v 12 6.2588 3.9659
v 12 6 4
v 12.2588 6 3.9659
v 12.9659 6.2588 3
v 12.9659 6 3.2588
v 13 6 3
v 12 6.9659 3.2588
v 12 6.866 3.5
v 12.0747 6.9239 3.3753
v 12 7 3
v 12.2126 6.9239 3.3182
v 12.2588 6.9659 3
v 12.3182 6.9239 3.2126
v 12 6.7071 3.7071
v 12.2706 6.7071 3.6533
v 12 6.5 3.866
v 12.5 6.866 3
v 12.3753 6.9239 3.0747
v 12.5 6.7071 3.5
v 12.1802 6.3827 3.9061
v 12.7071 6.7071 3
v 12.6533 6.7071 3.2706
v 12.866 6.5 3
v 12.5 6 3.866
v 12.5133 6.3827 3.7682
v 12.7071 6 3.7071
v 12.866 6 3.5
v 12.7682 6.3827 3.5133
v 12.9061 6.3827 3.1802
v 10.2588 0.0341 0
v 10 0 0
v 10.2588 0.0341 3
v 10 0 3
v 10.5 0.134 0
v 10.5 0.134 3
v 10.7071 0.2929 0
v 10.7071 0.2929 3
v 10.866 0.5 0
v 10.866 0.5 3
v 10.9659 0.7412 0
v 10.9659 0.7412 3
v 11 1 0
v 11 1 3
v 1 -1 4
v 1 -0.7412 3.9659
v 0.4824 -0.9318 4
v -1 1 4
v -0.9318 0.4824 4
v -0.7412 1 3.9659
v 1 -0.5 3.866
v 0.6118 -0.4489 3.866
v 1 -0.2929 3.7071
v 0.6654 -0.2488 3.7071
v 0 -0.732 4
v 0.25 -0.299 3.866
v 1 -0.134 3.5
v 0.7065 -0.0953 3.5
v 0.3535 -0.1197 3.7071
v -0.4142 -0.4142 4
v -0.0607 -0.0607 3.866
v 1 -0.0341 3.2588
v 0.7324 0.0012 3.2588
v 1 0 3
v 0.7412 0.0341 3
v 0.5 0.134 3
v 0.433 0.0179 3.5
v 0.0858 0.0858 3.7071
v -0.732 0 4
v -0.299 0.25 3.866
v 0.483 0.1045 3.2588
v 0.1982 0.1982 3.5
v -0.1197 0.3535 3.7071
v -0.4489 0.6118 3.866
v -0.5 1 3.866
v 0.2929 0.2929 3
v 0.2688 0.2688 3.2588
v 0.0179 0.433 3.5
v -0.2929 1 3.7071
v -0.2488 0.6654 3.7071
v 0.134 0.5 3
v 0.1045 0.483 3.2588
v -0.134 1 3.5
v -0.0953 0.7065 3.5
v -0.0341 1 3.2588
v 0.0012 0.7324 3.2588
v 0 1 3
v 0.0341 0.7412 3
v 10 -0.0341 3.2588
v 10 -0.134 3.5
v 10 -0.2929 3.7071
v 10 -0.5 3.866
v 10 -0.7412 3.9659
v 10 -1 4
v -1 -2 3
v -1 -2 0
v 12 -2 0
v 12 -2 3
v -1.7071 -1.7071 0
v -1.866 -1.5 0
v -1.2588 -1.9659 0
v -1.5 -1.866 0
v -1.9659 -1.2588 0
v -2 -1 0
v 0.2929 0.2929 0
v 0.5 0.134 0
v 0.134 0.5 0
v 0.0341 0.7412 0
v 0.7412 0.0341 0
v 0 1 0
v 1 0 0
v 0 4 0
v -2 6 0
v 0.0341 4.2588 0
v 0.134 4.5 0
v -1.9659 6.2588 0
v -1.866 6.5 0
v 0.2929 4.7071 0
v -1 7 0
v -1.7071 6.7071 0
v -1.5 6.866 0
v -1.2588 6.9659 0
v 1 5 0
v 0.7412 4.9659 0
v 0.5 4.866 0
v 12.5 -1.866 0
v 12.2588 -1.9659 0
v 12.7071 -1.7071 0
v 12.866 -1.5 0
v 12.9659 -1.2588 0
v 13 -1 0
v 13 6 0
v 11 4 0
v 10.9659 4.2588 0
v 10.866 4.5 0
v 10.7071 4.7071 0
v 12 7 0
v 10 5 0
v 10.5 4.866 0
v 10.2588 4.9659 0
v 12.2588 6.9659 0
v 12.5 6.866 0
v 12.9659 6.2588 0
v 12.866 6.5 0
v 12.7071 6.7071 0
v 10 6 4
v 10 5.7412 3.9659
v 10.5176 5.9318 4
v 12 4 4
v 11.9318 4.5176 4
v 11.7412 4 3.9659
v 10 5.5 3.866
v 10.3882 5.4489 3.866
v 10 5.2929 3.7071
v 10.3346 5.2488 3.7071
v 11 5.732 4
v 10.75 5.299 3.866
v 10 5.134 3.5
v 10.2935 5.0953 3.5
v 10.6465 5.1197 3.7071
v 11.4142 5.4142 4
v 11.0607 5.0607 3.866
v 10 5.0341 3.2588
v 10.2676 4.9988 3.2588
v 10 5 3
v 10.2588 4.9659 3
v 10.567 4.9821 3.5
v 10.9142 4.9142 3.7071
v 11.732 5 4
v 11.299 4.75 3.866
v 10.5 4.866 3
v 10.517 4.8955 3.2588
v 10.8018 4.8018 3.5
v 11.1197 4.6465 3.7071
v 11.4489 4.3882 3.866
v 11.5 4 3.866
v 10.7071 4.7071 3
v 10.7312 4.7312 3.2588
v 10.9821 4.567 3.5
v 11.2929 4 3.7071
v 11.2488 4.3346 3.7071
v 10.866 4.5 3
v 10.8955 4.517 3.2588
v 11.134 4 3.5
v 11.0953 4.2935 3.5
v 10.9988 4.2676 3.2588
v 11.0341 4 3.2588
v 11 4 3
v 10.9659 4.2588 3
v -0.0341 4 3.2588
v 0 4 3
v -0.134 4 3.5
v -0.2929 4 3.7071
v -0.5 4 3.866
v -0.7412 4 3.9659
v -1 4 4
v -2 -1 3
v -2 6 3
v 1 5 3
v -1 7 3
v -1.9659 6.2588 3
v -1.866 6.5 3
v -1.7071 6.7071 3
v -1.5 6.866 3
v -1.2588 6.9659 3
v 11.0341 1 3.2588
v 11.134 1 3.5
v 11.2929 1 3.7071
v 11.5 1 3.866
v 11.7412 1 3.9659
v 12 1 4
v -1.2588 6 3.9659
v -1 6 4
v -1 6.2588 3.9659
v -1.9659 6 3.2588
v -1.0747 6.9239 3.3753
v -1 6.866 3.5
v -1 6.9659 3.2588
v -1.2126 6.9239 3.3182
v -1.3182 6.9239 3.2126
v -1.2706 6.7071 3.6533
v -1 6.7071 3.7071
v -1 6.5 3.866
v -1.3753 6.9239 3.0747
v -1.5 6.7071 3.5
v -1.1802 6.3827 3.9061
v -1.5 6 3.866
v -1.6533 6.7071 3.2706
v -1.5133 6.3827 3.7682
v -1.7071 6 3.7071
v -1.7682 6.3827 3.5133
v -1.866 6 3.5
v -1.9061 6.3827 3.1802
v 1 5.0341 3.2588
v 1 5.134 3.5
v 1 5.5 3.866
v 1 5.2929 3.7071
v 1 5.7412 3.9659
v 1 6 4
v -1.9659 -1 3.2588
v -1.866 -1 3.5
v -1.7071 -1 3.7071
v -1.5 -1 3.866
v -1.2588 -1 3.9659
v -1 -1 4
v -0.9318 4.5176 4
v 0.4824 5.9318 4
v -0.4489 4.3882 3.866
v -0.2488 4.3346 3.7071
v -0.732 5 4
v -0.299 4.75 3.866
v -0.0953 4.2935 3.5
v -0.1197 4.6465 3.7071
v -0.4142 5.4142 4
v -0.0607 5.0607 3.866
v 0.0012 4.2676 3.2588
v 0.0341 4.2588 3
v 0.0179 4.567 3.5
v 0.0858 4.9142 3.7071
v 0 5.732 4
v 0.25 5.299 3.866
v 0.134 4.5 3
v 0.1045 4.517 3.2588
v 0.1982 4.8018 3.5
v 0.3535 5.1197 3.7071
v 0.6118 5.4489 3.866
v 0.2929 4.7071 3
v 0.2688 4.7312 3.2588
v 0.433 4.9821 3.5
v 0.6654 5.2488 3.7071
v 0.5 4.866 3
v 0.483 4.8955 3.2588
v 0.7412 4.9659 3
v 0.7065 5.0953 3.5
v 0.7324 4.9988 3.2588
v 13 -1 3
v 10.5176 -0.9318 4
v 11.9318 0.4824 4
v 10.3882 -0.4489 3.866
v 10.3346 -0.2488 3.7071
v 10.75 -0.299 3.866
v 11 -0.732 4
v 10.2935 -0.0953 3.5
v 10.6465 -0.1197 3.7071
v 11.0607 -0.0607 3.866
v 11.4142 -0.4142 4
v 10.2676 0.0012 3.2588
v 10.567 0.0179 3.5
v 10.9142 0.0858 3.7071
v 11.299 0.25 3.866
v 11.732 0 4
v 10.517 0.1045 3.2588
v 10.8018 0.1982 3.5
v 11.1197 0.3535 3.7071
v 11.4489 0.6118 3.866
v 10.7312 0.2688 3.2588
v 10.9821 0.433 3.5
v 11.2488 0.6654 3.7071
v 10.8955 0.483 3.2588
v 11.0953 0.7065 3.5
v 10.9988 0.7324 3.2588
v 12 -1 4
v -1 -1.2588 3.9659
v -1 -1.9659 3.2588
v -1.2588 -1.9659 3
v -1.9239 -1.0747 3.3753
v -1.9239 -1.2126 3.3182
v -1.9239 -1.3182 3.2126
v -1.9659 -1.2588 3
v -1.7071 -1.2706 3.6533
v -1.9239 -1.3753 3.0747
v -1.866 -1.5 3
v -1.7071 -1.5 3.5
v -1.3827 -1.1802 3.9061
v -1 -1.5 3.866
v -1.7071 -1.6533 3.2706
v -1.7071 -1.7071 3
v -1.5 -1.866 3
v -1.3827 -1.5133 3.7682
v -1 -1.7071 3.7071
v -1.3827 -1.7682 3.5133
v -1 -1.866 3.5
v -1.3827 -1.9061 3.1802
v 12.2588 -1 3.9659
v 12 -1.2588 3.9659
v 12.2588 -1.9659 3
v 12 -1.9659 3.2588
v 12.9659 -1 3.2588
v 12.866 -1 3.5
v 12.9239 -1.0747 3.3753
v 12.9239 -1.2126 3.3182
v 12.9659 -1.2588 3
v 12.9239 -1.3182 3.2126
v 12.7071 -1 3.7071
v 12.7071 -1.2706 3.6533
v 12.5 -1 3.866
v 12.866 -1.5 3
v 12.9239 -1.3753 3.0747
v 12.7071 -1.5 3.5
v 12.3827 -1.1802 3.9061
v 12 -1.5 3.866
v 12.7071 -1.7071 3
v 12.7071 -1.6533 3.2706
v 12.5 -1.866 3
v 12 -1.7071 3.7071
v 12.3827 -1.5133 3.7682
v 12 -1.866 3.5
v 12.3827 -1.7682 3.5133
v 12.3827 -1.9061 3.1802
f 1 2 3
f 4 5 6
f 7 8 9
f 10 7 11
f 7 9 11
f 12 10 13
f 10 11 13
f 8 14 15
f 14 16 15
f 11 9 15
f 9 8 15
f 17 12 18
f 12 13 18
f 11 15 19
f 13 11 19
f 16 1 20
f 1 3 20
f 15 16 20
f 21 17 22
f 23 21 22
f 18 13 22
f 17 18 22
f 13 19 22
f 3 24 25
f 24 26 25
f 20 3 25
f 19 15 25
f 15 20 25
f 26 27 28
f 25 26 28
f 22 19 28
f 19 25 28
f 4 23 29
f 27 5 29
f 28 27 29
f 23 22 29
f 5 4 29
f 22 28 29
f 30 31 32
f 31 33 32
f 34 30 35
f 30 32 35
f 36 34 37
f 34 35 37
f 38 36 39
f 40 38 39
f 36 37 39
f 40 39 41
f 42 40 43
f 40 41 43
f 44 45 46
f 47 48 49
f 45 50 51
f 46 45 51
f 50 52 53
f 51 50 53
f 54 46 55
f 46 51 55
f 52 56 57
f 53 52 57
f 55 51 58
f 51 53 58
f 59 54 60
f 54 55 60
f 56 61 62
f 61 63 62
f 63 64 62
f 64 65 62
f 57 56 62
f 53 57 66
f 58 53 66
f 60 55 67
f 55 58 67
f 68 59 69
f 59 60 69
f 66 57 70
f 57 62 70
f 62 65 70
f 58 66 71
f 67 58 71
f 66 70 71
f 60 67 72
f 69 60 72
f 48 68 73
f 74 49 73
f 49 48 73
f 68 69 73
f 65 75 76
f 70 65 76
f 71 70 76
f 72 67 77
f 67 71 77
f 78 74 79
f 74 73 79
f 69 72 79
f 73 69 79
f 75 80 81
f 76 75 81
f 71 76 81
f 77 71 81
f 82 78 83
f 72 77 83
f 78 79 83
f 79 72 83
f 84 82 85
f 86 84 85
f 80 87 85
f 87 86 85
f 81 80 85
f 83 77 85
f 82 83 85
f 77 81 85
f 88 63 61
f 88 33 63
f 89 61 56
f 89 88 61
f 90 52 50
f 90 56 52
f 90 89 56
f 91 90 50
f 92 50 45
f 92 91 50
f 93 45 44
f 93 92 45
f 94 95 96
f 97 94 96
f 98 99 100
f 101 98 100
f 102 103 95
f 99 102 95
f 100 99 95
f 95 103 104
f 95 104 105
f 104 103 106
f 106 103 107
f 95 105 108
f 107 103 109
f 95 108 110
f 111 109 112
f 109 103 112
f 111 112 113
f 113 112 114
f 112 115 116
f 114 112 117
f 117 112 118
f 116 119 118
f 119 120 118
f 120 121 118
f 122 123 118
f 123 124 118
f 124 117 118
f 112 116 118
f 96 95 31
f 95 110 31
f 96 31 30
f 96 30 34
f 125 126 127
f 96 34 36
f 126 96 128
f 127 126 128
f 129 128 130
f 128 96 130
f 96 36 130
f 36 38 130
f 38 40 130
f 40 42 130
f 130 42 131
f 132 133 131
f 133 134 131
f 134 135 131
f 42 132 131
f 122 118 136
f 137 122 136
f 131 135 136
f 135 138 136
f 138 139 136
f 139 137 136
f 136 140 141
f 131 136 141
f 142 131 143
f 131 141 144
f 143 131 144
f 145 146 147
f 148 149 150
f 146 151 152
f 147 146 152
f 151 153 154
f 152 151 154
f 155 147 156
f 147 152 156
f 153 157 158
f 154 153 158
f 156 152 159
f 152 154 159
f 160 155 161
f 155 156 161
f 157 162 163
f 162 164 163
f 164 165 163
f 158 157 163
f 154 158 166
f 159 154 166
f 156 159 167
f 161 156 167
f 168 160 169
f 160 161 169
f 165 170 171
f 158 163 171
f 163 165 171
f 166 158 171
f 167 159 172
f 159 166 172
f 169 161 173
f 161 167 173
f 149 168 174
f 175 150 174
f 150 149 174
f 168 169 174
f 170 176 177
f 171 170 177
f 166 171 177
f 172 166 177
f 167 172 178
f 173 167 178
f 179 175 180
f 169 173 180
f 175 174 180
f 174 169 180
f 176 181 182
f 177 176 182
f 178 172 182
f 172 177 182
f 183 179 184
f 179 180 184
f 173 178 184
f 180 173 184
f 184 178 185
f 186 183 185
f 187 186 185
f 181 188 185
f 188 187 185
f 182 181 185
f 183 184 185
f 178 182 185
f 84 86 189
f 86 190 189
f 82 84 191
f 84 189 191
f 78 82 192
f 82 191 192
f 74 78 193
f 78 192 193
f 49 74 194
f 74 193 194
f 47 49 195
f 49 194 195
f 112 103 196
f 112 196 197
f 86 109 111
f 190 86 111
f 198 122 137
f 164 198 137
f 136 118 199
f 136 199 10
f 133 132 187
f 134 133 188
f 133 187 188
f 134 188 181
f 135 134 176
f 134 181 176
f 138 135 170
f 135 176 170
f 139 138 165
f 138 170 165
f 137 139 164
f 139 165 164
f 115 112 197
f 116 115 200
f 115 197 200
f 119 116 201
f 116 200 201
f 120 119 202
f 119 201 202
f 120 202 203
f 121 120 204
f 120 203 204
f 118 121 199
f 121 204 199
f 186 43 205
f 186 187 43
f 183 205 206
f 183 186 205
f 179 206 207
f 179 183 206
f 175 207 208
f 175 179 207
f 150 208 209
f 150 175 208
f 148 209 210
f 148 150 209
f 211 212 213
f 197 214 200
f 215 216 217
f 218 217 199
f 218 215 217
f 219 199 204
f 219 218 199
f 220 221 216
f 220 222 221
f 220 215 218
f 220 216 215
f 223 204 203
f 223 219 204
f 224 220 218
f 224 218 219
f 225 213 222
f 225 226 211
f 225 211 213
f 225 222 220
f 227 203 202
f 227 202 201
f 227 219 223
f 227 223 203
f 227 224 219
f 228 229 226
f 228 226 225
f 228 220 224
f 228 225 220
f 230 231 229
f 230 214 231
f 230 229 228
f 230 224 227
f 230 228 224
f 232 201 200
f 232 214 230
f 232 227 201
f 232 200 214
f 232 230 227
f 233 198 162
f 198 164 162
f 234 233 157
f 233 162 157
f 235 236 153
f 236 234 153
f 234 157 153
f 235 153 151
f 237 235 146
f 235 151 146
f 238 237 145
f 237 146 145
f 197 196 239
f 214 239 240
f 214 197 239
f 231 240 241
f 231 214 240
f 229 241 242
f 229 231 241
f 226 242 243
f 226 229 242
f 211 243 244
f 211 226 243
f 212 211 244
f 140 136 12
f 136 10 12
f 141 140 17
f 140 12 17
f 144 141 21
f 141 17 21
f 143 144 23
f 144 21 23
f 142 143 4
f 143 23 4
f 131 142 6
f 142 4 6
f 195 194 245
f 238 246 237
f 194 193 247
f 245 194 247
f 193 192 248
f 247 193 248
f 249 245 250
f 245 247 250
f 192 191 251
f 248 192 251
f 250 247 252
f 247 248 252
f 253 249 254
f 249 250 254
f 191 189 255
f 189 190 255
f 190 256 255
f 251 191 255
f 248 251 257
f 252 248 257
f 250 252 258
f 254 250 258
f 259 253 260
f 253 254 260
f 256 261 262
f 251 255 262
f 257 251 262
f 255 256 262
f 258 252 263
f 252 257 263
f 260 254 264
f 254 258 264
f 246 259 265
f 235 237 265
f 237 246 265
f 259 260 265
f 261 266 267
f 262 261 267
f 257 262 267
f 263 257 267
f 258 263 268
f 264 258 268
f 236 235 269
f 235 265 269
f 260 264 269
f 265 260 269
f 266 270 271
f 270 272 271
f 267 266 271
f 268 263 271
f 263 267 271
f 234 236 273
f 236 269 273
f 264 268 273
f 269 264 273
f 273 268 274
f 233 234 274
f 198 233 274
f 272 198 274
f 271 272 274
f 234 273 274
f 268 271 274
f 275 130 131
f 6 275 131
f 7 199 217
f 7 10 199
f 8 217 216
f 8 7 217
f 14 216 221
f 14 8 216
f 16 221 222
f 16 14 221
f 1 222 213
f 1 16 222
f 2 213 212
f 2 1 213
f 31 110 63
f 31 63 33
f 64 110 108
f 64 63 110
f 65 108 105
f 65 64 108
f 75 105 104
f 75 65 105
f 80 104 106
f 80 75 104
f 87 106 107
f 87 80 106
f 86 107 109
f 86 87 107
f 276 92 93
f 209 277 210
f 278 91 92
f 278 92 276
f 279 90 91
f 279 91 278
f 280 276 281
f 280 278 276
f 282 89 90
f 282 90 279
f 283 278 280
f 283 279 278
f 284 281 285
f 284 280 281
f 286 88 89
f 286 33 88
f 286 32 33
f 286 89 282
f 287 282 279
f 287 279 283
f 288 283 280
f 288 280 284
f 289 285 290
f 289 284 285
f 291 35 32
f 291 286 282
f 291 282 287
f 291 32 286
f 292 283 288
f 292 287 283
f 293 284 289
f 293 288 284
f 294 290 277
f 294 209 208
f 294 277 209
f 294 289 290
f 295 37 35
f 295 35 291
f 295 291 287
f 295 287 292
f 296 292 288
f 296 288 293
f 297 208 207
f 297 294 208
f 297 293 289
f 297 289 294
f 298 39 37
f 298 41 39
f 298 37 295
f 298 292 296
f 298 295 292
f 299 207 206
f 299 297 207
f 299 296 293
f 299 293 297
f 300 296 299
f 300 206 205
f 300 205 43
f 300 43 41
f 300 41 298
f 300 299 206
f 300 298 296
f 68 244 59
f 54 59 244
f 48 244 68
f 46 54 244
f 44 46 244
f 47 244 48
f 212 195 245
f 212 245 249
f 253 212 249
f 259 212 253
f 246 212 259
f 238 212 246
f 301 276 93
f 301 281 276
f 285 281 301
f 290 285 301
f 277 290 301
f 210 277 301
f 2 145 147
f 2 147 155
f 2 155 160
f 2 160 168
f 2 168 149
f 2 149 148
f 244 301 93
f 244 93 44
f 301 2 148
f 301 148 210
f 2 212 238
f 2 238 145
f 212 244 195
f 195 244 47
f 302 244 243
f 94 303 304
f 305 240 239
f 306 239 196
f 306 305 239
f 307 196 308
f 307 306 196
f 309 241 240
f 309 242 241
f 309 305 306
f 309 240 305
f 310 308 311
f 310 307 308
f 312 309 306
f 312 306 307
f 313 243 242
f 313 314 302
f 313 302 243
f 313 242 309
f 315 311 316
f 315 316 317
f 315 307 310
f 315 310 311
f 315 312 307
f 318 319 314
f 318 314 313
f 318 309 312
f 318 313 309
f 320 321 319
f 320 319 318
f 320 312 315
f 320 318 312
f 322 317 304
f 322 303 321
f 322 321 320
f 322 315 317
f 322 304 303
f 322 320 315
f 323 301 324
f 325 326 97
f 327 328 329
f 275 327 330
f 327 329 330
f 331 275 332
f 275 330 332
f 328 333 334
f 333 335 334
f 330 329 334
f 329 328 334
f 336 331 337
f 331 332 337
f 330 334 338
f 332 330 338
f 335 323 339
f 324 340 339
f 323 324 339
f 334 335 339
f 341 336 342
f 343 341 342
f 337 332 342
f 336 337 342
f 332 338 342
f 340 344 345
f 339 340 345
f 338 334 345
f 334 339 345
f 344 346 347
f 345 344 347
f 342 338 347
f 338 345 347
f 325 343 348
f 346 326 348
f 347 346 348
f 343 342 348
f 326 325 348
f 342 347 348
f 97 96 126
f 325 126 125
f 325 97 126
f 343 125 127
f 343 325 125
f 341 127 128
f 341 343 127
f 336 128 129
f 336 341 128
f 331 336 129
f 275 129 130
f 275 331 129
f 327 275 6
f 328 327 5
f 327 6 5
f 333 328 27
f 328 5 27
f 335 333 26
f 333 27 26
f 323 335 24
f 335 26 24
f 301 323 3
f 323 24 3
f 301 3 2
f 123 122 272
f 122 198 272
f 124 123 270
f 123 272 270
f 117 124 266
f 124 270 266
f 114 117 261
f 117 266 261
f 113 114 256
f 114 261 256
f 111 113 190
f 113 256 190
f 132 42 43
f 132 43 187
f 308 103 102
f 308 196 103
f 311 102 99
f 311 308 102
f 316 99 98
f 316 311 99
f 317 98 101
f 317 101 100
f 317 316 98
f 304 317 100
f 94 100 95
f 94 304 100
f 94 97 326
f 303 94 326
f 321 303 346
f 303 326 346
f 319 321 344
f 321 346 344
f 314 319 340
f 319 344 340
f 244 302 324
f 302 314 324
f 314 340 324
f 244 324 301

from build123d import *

# Parameters (mm, degrees)
F0_W     = 15
F0_H     = 9
F0_W_2   = 11
F0_H_2   = 5
F1_DEPTH = 4
F2_R     = 0.99999


# Not quite as in the source:
# - a fillet or chamfer is up to 0.001 mm smaller than in the source, because OpenCascade refuses the exact size


with BuildPart() as f1:
    # F0 (on Top) → F1 (new body)
    with BuildSketch(Plane.XY):
        with Locations((5.5, 2.5)):
            Rectangle(F0_W, F0_H)
        with Locations((5.5, 2.5)):
            Rectangle(F0_W_2, F0_H_2, mode=Mode.SUBTRACT)
    extrude(amount=F1_DEPTH)

    # F2 (radius 1 in the source; OpenCascade refuses exactly that, so slightly less here)
    f2_edges = [f1.edges().sort_by_distance(p)[0] for p in [
        (5.5, -2, 4),
        (13, 2.5, 4),
        (5.5, 0, 4),
        (-2, 2.5, 4),
        (0, 2.5, 4),
        (5.5, 7, 4),
        (5.5, 5, 4),
        (11, 2.5, 4),
        (-2, -2, 2),
        (13, -2, 2),
        (11, 0, 2),
        (0, 0, 2),
        (-2, 7, 2),
        (13, 7, 2),
        (11, 5, 2),
        (0, 5, 2),
    ]]
    fillet(f2_edges, radius=F2_R)


solid = f1.part
